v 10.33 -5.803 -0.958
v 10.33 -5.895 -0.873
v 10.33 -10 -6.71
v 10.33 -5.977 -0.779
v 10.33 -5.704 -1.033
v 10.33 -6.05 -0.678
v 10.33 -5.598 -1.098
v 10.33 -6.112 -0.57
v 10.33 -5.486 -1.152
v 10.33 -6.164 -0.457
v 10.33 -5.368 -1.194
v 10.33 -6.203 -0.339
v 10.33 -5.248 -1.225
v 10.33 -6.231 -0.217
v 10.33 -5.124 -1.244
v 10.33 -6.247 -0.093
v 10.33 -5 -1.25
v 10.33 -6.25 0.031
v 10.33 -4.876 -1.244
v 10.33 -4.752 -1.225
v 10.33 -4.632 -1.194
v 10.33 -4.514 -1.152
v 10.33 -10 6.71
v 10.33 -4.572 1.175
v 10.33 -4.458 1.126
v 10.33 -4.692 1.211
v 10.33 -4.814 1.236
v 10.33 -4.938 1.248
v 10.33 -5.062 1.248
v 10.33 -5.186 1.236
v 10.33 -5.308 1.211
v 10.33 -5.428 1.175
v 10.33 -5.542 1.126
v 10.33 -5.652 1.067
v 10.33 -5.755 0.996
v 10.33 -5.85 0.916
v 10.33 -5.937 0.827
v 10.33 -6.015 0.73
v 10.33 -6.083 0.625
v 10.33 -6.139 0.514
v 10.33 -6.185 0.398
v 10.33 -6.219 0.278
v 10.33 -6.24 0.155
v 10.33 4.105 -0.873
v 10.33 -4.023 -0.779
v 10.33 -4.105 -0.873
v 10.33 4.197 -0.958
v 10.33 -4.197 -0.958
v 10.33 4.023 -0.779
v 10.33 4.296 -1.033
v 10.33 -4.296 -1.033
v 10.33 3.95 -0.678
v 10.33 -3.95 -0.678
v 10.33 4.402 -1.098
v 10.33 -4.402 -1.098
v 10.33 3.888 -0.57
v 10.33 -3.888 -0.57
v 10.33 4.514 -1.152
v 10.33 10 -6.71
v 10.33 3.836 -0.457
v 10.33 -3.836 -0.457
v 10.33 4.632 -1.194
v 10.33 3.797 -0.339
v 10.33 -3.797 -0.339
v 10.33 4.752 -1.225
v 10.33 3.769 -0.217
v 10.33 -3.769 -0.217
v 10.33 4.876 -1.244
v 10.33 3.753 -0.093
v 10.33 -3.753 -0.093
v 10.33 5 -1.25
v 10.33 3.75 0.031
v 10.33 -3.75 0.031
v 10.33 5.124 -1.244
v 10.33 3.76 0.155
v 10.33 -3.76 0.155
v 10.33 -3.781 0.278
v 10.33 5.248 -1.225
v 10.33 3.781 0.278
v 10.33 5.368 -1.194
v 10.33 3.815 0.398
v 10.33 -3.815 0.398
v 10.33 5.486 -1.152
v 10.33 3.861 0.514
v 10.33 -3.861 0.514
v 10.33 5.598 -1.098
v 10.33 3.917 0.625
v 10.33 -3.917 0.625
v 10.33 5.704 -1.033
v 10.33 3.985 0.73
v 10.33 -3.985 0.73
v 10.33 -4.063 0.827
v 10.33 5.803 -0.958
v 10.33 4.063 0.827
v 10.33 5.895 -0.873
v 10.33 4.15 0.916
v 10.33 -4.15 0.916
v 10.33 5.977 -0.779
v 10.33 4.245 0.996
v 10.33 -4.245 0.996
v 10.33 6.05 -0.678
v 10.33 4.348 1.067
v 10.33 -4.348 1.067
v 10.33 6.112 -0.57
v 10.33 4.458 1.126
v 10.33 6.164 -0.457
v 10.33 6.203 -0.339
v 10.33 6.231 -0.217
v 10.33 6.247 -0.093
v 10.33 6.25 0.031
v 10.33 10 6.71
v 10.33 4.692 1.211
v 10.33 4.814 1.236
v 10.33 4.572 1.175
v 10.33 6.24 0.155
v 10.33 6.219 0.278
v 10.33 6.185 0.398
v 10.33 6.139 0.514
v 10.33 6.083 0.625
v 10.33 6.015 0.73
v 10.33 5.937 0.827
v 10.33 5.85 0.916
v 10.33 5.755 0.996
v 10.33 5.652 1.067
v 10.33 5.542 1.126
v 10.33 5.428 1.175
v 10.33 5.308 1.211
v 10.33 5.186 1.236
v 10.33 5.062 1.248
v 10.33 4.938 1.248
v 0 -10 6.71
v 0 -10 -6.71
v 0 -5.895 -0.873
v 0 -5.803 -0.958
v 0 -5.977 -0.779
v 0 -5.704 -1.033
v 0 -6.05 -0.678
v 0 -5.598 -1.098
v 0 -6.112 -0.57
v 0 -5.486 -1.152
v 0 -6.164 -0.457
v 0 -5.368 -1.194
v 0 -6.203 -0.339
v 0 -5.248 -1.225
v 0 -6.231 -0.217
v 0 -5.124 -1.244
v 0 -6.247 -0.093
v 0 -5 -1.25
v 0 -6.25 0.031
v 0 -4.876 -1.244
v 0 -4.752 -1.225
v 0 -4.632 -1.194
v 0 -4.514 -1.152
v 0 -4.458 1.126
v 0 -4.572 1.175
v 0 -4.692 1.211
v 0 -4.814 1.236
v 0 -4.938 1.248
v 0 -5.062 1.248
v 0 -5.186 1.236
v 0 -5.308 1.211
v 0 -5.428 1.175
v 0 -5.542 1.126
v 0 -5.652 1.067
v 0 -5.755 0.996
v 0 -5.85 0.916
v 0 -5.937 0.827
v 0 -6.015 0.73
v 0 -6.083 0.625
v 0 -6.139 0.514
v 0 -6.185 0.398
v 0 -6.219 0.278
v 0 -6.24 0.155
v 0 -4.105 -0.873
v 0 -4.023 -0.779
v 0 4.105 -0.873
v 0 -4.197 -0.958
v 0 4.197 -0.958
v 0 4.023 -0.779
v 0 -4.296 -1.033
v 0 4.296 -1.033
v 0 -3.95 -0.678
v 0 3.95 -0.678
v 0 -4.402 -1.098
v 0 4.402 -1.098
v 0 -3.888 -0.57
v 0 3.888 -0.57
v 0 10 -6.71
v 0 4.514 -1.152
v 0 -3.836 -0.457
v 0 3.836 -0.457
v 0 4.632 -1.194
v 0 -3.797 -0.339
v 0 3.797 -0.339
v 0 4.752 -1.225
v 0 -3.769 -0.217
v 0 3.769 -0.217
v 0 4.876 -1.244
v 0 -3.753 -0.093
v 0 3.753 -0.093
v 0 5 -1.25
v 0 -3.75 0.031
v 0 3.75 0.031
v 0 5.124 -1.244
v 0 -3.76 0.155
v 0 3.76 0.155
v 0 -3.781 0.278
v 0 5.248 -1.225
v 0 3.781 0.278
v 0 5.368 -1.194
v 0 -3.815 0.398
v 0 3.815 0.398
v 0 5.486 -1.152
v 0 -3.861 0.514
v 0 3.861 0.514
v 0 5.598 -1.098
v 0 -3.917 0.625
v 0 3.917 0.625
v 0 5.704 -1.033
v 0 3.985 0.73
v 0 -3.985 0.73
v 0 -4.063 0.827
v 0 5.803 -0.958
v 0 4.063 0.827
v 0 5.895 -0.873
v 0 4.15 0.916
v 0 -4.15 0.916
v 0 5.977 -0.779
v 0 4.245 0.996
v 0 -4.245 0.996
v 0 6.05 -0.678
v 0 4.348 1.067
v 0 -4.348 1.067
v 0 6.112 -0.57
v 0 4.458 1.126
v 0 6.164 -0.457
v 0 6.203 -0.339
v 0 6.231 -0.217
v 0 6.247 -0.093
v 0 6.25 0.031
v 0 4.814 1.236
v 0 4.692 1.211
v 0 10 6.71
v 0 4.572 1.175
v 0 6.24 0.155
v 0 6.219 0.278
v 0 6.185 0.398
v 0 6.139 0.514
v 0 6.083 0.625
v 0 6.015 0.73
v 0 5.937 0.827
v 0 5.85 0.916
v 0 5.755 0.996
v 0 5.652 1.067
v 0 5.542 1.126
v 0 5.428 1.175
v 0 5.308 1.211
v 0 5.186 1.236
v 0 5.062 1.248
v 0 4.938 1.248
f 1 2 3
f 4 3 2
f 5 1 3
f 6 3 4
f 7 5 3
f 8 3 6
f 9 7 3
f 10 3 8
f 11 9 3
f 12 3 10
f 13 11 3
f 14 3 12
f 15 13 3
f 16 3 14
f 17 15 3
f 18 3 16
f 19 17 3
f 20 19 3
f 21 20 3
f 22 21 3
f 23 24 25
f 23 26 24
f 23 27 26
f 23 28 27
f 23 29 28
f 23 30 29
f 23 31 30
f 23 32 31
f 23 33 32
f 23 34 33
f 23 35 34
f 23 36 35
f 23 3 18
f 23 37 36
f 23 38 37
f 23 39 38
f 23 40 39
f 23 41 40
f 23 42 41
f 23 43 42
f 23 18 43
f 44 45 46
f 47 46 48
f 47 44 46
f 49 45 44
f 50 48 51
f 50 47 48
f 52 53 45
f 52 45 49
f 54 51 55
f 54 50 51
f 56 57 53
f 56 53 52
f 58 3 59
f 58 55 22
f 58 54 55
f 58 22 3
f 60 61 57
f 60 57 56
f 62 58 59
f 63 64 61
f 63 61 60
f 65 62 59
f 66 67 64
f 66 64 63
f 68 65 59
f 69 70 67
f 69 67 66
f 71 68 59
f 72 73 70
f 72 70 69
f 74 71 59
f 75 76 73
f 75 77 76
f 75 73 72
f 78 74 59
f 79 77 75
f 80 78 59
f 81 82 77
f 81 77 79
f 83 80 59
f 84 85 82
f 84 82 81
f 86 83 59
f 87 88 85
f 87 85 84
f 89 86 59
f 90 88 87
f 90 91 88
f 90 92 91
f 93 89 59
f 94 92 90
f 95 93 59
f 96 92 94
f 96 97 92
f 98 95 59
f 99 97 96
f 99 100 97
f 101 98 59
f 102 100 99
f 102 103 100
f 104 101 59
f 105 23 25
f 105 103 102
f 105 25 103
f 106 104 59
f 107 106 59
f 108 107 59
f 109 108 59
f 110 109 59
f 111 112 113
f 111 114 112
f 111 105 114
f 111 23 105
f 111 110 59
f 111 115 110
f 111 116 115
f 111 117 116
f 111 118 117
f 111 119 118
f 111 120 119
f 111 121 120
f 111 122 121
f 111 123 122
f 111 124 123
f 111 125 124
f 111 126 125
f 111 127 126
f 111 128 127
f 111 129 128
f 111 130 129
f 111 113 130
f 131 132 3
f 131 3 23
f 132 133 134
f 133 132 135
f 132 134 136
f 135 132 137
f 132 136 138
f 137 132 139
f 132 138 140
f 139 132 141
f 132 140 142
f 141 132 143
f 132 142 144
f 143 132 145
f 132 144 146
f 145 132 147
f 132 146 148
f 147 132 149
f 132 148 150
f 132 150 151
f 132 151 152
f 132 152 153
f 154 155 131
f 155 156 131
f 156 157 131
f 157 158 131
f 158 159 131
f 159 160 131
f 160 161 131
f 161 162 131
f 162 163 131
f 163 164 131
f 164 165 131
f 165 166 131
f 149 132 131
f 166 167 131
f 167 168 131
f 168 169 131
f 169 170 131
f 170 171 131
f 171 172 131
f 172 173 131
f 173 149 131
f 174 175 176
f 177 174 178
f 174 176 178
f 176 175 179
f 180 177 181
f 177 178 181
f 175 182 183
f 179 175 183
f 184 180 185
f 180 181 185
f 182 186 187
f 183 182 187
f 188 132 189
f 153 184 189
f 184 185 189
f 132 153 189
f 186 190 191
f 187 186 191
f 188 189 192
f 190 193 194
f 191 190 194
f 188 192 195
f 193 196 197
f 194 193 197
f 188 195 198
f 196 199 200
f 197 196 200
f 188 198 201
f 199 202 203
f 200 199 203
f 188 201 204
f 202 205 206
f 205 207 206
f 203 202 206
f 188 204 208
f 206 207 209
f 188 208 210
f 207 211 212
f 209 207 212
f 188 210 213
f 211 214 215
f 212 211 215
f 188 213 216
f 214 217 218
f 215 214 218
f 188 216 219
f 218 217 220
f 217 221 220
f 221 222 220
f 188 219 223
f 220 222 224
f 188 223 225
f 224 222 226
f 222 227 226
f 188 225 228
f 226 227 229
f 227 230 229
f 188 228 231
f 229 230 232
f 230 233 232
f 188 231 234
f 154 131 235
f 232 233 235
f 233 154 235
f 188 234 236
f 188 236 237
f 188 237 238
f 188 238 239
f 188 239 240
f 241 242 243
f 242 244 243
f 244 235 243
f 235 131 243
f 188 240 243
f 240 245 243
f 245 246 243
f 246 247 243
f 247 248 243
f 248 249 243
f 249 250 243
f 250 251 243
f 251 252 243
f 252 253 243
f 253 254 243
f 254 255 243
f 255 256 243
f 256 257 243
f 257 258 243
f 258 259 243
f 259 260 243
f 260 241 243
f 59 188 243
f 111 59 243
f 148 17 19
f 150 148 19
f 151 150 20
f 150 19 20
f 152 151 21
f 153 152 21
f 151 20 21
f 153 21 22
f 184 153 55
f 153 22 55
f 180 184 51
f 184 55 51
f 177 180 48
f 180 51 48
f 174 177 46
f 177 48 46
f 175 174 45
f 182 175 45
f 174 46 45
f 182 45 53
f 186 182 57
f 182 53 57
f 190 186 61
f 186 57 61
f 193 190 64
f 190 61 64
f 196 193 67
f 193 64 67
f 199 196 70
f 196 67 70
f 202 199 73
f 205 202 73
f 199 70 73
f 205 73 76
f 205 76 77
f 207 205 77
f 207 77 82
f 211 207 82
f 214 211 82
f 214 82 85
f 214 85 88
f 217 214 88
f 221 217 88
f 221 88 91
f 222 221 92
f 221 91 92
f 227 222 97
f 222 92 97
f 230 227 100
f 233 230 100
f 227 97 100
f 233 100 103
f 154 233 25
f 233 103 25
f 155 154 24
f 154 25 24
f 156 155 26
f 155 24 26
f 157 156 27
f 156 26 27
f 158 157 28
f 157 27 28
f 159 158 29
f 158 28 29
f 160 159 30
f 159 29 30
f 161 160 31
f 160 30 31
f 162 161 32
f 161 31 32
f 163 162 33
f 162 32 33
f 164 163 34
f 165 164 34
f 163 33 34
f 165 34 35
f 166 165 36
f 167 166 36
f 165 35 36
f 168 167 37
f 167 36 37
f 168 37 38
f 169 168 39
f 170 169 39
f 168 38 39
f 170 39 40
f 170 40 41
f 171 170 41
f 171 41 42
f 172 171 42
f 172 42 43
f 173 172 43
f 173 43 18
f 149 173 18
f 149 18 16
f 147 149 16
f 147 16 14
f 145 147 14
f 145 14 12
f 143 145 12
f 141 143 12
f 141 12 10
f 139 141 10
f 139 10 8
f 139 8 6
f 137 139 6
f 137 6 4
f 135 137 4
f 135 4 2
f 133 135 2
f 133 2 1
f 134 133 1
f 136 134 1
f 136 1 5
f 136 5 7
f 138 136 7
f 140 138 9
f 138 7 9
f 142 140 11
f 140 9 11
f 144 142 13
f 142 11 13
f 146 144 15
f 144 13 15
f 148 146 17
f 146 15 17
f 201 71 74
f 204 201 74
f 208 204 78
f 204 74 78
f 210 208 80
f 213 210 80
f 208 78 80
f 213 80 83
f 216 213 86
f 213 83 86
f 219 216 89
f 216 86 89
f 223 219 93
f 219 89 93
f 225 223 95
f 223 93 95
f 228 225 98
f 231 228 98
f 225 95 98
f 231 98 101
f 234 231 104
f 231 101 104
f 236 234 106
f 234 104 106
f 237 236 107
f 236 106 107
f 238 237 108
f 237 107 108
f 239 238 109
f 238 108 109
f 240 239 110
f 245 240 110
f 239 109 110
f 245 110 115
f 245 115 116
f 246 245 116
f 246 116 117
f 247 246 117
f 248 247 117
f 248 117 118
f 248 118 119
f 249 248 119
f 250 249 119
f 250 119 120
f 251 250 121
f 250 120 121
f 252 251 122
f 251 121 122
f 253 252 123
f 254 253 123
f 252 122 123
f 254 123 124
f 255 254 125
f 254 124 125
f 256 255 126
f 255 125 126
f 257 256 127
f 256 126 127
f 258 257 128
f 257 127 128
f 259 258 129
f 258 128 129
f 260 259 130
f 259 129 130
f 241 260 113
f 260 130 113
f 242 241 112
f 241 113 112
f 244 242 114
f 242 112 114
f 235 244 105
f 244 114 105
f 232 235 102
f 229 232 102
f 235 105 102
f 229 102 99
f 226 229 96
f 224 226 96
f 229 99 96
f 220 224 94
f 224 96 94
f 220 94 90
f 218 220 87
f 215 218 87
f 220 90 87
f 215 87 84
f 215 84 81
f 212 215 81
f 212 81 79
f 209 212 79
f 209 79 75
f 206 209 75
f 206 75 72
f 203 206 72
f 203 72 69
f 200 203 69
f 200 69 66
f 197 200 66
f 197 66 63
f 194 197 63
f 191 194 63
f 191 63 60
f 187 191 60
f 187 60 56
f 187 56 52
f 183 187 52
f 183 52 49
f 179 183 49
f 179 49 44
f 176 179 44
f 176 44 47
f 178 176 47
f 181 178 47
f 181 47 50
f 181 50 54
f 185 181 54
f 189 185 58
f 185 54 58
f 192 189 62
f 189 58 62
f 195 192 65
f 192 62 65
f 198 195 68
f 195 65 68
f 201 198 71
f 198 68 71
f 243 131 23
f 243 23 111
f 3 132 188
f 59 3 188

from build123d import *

# Parameters (mm, degrees)
SKETCH1_W           = 20
SKETCH1_H           = 13.42
BOSS_EXTRUDE1_DEPTH = 10.33
SKETCH2_R           = 1.25
CUT_EXTRUDE1_DEPTH  = 10.33


with BuildPart() as part:
    # Sketch1 → Boss-Extrude1 (new body)
    with BuildSketch(Plane.YZ):
        Rectangle(SKETCH1_W, SKETCH1_H)
    extrude(amount=BOSS_EXTRUDE1_DEPTH)

    # Sketch2 → Cut-Extrude1 (cut)
    with BuildSketch(Plane(origin=(10.33, 0, 0), x_dir=(0, 0, -1), z_dir=(1, 0, 0))):
        with Locations((0, 5)):
            Circle(SKETCH2_R)
        with Locations((0, -5)):
            Circle(SKETCH2_R)
    extrude(amount=-CUT_EXTRUDE1_DEPTH, mode=Mode.SUBTRACT)


solid = part.part
